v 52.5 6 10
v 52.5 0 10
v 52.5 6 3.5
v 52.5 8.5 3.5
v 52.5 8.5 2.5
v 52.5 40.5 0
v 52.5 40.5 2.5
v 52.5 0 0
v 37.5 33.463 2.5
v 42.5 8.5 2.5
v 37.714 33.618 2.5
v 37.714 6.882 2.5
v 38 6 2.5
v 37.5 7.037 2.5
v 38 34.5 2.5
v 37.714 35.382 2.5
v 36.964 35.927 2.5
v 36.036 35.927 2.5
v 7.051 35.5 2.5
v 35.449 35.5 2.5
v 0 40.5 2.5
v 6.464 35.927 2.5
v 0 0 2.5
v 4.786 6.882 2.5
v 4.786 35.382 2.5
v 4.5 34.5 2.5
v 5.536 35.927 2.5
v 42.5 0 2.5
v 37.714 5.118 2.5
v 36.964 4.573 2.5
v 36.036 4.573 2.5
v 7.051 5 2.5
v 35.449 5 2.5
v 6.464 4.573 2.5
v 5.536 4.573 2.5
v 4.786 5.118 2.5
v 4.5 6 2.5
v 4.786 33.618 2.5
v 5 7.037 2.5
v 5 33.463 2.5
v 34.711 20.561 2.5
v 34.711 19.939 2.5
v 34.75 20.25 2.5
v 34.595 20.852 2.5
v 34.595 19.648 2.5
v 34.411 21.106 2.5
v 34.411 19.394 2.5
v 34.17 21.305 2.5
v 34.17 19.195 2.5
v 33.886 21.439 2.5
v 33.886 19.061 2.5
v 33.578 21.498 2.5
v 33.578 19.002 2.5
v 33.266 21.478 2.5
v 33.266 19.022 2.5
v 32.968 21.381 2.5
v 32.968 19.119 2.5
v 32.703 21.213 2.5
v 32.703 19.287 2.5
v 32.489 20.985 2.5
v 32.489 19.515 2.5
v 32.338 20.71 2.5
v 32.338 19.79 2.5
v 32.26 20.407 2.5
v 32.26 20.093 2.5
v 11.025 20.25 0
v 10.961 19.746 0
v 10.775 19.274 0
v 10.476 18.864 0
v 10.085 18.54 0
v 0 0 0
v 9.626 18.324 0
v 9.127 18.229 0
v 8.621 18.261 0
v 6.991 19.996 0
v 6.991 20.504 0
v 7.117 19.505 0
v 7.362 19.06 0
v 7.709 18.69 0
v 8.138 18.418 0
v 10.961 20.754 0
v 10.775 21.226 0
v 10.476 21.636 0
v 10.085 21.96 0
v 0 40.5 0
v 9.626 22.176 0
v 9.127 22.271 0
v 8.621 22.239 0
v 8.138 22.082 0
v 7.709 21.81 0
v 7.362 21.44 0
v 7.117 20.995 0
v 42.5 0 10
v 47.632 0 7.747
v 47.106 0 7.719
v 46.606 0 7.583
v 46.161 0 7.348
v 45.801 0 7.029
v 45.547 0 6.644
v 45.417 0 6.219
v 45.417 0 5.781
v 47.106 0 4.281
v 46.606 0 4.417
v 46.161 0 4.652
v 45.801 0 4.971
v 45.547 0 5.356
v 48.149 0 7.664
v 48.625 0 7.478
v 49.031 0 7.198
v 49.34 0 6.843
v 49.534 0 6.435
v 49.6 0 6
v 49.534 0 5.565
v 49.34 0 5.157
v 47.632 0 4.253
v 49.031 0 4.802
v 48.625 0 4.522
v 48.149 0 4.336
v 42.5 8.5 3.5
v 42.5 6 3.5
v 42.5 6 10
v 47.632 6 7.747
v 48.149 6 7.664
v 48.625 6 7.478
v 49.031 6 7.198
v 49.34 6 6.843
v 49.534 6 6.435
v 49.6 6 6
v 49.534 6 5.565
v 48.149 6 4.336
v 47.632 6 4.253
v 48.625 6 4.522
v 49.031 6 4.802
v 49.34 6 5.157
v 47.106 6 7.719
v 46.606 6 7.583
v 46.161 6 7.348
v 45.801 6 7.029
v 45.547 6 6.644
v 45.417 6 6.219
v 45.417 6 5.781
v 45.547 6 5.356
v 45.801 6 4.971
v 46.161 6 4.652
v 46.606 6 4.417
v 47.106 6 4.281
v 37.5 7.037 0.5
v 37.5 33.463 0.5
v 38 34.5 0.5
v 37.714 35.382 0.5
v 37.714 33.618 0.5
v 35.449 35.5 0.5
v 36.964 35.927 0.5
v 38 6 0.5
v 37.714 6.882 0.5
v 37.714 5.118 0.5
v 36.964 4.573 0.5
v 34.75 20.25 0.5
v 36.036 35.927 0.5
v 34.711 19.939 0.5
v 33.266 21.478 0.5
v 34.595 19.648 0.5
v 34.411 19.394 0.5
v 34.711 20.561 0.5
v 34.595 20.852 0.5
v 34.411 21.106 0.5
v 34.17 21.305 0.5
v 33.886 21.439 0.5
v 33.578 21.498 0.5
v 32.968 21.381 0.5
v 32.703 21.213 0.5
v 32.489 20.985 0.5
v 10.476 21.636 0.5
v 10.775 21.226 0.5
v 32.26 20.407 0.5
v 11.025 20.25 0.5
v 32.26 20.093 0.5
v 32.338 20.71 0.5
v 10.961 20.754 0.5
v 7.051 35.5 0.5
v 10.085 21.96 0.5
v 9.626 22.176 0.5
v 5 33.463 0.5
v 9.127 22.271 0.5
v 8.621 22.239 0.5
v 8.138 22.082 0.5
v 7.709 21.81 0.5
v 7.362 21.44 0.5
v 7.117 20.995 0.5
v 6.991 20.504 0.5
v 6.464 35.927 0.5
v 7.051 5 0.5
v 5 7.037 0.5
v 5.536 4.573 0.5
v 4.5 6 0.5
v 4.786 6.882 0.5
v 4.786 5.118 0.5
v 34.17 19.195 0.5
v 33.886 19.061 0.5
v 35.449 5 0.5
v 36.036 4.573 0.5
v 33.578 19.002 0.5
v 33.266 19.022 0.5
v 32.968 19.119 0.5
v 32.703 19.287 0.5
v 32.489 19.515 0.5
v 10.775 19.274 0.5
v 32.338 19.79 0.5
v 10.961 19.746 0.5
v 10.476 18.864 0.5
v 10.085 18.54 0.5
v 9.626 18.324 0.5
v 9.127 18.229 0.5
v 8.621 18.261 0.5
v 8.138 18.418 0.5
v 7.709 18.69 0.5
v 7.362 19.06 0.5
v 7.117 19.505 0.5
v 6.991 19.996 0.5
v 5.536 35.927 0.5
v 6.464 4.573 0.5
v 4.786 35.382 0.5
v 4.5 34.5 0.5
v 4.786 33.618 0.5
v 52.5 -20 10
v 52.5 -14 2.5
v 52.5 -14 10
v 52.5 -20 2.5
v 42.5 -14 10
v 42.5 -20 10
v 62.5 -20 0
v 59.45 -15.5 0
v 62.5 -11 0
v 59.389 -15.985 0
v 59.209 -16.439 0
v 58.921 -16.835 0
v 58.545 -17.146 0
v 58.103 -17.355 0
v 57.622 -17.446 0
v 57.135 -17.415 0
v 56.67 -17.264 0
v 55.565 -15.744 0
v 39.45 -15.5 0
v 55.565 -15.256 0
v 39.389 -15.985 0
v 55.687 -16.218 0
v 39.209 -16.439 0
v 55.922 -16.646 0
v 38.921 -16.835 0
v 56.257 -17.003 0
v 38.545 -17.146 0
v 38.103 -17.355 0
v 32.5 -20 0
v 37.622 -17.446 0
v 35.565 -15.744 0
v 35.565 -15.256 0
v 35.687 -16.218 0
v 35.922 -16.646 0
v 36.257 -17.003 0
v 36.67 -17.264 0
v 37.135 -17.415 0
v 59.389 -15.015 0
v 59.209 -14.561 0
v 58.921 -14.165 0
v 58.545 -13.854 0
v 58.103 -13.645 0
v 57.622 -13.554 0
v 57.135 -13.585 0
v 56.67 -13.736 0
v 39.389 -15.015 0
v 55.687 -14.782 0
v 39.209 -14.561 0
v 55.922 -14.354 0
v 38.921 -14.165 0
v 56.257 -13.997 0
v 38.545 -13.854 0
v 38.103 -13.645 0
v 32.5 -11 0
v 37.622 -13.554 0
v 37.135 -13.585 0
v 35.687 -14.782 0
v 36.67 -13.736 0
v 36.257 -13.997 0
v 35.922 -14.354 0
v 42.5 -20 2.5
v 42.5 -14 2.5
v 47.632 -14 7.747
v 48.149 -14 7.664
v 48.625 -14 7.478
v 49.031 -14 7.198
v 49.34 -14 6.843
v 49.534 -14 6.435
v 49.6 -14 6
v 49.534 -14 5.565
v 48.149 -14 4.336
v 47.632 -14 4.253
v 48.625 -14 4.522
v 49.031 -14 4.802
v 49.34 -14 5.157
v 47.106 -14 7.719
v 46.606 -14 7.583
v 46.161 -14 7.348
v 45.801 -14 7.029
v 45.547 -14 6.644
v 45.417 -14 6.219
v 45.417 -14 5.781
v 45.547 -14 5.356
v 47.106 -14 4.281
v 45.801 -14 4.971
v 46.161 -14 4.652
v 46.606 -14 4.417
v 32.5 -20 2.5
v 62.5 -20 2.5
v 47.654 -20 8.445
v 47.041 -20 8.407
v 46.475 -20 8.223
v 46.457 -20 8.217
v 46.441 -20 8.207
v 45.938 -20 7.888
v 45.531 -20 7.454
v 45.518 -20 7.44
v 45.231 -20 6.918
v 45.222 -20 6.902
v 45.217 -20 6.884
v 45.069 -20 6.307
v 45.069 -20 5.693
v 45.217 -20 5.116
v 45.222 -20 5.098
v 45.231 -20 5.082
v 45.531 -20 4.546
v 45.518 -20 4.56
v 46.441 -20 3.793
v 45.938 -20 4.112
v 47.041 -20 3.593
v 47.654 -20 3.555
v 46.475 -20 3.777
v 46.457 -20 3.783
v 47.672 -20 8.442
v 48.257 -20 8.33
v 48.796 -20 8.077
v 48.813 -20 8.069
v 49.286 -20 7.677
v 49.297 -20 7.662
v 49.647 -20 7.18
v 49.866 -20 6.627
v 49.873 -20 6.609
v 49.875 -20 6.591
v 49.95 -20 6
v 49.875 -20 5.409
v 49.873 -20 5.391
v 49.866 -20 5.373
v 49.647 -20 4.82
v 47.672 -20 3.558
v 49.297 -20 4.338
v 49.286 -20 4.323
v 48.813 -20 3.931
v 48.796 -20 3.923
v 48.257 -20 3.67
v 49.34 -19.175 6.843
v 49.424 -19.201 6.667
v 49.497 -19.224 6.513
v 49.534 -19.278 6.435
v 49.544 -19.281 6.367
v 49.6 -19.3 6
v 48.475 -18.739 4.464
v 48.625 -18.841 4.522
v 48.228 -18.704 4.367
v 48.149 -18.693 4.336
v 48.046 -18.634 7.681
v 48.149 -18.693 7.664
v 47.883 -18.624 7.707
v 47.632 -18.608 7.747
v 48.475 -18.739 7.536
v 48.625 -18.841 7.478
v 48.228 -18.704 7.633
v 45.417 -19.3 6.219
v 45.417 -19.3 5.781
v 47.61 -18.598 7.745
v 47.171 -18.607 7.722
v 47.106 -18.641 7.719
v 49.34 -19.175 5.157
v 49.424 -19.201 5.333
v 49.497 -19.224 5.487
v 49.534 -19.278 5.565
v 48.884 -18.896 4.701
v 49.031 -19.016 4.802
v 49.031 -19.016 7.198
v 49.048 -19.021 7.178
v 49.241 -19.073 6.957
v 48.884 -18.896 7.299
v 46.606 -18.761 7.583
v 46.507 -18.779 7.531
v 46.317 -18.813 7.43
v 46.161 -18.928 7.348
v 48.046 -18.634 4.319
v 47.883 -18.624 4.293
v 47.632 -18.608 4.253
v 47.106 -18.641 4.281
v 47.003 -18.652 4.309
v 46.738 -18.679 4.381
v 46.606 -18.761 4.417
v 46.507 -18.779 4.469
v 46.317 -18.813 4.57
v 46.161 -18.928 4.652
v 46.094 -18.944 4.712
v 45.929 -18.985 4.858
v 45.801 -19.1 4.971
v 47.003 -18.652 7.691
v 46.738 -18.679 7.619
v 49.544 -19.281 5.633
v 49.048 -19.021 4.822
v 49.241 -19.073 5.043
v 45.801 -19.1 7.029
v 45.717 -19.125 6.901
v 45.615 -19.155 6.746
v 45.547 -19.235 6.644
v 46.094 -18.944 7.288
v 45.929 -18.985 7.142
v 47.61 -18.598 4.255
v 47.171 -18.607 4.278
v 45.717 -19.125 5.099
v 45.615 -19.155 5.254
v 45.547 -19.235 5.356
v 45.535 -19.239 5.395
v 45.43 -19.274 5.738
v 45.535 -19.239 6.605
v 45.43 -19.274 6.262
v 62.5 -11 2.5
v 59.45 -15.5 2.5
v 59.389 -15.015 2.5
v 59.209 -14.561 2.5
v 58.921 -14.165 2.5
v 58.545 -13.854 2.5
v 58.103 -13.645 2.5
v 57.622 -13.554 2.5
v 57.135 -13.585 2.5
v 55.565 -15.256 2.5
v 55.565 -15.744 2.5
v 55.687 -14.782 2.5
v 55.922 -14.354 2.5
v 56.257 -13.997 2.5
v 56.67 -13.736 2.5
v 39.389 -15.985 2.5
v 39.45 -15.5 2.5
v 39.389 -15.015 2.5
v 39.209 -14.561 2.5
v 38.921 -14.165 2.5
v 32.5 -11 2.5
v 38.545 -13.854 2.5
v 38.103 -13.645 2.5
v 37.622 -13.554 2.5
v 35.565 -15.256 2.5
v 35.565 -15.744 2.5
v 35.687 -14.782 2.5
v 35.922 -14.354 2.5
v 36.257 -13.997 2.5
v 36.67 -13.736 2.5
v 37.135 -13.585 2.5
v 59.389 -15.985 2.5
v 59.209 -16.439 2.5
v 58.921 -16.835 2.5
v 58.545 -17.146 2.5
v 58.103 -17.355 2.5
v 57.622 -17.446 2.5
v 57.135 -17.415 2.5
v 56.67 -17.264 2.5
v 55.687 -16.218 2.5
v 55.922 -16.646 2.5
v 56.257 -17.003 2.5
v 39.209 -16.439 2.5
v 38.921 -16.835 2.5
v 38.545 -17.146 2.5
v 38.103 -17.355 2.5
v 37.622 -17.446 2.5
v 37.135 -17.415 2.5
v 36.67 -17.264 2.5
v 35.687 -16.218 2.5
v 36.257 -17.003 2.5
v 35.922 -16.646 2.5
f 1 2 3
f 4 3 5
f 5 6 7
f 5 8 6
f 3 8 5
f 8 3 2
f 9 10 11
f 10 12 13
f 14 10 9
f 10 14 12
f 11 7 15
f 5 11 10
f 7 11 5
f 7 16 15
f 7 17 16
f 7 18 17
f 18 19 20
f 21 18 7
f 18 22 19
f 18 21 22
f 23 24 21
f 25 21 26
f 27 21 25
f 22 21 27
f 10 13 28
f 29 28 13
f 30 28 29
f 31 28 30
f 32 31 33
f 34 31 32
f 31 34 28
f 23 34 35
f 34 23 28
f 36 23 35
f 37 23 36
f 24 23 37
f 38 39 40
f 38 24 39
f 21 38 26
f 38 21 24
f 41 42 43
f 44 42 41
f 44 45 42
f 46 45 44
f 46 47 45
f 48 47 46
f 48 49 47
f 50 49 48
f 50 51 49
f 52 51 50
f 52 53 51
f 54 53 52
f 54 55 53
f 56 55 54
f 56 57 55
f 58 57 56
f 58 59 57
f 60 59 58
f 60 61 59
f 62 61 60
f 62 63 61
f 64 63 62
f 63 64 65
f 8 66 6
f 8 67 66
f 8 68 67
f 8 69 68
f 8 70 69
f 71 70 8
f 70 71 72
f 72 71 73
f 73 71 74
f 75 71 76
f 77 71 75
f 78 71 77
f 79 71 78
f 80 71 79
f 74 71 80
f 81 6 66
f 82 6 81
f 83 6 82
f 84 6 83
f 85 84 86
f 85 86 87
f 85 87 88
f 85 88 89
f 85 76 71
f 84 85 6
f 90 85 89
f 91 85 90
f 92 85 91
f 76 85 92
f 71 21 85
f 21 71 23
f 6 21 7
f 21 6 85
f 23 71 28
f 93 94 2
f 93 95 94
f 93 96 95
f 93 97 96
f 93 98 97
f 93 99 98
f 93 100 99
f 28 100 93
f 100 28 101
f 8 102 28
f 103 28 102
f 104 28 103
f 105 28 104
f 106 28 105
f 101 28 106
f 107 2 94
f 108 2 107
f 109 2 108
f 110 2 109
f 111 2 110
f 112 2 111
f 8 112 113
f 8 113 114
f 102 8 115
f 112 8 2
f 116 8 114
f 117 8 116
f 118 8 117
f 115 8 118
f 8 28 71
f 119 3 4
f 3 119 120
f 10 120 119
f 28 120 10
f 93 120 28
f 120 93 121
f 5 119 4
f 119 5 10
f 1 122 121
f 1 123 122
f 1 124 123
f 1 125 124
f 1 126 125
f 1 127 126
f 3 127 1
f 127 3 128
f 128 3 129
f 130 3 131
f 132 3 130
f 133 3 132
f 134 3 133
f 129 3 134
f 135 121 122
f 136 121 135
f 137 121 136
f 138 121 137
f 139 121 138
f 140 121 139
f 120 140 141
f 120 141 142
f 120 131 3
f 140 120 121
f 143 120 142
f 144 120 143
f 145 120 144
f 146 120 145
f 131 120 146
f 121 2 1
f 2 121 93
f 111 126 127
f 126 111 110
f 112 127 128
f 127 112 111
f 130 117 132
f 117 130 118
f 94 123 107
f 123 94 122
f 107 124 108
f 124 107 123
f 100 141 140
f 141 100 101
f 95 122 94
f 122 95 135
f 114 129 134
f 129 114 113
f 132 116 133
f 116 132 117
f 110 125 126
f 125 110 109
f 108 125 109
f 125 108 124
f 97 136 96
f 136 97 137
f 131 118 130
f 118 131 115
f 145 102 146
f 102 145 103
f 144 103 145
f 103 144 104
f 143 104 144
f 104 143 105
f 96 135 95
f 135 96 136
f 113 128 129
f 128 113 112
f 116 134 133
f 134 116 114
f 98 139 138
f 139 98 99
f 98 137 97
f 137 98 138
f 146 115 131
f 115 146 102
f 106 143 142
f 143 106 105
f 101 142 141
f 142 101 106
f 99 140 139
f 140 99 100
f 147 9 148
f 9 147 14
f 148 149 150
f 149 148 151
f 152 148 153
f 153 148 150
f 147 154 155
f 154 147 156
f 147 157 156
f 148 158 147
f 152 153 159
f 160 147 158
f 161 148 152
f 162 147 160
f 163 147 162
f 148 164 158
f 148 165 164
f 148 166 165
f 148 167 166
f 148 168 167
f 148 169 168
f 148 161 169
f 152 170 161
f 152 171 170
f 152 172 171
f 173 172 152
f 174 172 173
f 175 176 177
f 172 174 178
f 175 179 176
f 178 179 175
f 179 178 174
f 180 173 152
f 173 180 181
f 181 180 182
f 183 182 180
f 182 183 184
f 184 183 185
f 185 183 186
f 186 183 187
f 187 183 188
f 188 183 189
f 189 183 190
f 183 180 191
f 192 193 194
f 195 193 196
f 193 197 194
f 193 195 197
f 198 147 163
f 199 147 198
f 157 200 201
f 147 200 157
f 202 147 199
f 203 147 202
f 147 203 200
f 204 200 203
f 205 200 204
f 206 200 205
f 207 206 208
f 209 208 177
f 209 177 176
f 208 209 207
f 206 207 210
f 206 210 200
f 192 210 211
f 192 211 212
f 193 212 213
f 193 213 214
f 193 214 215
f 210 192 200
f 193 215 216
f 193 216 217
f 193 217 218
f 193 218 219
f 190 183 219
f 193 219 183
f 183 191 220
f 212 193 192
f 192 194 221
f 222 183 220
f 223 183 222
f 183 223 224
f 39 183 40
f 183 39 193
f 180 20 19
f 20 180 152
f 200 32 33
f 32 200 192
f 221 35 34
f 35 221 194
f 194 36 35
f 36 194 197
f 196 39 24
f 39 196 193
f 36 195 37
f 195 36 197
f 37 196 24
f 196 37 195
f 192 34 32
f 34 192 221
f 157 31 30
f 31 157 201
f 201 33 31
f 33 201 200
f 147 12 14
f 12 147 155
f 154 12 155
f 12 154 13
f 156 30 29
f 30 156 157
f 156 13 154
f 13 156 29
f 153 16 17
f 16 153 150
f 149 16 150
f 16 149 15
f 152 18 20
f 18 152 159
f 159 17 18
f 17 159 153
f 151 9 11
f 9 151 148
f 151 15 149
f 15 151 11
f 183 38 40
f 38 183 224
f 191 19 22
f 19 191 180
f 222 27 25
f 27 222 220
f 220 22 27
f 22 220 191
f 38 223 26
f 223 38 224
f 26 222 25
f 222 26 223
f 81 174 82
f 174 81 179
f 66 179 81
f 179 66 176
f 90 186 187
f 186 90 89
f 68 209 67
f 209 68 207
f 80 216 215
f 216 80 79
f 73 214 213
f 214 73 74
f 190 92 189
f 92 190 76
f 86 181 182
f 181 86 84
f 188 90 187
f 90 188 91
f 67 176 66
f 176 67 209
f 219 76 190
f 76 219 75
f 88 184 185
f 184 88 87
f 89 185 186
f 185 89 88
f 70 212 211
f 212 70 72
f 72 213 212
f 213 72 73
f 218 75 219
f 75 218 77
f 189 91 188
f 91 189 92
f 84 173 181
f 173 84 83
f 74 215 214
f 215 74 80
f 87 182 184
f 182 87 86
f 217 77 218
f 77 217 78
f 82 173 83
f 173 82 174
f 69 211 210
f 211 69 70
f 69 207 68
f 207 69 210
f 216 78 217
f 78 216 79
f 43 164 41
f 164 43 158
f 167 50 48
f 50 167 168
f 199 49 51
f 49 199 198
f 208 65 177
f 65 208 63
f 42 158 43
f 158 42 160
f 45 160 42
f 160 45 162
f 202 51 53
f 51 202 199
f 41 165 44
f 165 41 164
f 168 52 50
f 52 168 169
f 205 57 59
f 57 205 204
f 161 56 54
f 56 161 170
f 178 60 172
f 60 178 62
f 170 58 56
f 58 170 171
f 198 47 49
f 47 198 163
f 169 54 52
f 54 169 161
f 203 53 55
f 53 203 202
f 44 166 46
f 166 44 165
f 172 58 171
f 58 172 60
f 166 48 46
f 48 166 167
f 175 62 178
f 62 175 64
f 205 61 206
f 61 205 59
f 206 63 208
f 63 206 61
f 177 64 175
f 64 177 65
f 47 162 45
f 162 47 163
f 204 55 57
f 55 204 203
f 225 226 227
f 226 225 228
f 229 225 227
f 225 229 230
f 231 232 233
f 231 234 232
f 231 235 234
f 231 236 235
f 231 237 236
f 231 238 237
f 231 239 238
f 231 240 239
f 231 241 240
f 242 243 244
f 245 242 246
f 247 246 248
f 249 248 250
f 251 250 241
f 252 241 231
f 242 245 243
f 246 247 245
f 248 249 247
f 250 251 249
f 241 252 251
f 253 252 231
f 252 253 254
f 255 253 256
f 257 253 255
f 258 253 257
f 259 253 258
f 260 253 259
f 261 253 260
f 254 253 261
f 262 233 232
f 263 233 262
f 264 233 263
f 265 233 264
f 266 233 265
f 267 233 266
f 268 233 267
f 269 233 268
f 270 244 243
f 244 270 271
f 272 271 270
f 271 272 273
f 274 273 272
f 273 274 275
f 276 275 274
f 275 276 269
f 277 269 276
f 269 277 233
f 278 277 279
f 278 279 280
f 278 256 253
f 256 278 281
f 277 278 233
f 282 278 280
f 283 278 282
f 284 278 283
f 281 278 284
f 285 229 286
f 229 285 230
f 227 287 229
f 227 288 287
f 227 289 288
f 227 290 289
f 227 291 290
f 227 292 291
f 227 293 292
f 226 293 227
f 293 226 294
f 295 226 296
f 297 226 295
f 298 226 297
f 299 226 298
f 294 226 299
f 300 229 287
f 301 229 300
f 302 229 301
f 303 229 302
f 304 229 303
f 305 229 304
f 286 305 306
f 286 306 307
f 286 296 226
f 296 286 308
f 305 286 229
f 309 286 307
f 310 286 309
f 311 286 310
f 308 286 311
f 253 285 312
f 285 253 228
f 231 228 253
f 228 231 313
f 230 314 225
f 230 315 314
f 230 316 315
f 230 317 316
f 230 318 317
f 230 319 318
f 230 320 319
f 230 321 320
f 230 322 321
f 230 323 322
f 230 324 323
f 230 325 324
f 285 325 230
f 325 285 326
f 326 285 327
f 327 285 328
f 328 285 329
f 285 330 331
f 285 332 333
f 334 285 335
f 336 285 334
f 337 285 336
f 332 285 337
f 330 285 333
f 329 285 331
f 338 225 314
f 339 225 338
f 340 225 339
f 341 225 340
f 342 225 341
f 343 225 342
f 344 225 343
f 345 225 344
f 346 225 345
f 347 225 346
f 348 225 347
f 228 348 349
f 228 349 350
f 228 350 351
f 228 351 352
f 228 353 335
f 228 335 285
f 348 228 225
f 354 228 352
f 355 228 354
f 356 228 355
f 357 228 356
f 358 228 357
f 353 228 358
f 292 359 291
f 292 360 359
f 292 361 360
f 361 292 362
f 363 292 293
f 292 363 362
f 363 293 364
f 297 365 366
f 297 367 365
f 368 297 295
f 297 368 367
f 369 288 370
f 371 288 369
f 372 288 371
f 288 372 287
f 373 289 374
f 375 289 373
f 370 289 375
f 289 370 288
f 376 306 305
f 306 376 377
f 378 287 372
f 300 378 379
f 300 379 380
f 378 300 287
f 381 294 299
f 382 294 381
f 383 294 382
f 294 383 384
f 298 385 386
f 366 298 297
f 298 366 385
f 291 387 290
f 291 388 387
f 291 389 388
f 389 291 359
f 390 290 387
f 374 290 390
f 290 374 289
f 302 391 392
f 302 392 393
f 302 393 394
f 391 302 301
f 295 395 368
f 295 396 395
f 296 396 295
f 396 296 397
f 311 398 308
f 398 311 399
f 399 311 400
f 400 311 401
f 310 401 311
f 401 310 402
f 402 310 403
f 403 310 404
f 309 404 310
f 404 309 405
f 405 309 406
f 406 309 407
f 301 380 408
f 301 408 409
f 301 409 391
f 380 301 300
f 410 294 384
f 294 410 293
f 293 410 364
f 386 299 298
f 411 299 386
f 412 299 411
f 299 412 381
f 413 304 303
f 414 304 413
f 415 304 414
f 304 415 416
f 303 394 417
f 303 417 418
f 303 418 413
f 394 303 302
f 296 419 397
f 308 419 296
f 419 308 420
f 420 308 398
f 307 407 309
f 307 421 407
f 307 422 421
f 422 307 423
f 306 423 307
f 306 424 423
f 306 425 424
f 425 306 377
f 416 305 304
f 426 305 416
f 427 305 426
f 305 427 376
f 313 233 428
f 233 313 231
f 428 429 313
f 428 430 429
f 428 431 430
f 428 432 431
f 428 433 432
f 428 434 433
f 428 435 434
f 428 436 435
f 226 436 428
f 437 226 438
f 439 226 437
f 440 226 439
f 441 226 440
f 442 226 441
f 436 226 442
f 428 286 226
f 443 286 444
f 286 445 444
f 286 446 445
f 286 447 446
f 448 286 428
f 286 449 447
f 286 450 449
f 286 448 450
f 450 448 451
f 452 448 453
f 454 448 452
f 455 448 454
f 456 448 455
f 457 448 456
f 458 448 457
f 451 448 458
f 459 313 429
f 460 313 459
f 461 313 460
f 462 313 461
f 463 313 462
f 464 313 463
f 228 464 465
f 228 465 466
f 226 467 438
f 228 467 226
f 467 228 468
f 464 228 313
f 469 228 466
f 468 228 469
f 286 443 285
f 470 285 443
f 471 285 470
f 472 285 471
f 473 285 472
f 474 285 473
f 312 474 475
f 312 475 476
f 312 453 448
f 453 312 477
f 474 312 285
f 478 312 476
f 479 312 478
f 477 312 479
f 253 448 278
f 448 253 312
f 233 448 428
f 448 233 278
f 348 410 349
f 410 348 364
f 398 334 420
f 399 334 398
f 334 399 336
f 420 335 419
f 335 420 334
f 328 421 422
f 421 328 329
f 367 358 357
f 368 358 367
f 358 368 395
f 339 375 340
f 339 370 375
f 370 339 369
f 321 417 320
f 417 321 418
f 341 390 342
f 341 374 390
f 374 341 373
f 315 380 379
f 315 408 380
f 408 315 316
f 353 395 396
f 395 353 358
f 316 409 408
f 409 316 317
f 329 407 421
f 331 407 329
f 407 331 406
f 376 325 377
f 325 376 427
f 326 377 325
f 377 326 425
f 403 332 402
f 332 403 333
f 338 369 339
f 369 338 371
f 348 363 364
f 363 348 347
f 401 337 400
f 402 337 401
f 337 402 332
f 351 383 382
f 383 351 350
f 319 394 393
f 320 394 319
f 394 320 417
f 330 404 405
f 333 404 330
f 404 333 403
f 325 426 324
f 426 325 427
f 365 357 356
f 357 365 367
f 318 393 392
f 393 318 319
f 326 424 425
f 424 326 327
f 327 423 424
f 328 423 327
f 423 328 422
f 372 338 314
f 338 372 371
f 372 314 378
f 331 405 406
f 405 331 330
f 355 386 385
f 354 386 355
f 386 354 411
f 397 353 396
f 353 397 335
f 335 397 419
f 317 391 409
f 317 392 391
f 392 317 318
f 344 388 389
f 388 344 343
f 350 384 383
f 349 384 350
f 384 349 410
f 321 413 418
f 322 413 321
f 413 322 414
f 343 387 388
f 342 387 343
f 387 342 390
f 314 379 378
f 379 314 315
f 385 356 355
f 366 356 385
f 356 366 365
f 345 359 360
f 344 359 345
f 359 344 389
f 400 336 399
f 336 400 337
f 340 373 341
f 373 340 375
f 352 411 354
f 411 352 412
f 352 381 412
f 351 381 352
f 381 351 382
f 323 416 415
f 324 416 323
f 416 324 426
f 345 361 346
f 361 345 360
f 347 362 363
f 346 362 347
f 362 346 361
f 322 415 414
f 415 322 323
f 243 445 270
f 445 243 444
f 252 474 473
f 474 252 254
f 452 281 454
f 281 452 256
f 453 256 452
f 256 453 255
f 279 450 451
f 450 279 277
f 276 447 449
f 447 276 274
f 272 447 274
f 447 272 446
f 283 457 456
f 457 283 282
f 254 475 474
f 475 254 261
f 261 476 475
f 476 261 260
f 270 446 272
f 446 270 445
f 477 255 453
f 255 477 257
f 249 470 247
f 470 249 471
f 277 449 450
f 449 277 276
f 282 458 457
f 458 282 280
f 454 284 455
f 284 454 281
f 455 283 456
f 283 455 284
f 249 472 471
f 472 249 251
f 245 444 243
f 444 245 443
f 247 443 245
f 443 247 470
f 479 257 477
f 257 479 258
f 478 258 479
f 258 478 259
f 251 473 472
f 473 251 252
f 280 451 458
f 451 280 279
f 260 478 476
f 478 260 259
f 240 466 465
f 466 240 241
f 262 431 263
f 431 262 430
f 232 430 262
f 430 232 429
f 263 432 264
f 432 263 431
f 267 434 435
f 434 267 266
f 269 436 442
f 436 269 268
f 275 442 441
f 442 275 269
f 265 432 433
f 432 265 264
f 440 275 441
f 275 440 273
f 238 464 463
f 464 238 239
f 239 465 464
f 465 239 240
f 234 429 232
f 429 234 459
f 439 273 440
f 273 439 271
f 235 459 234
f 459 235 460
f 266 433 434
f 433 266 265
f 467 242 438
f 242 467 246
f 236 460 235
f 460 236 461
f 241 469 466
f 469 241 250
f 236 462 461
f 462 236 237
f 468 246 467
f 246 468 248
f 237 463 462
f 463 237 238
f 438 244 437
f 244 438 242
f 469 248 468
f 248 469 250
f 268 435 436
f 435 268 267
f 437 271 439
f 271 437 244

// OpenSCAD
// Aimer design for the laser holder 

// Extra spacing to print internal sizes more correctly. 
internal_size_fudge = 0.5;

// Sizes of holder
holder_width = 32+internal_size_fudge;
holder_length = 30+internal_size_fudge;
holder_hole_diam = 3 ;
holder_hole_distance = 4; // (3/2+1.8)
holder_corner_diam = 3 ;

// Sizes of the aimer
aimer_border_thickness = 5;
aimer_border_height = 2;
aimer_bottom_thickness = 0.5;

aimer_set_screw_diam = 3.5;
aimer_set_screw_height = 6;
aimer_set_width = 10;
aimer_set_length = 6;
aimer_set_height = 10;
aimer_stud_length = aimer_set_length + 3;

aimer_width = holder_width+aimer_border_thickness*2+aimer_set_width;
aimer_length = holder_length+aimer_border_thickness*2;

stud_width = 30;
stud_screw_diam = 3*1.3;

module holder_point() {
    cylinder(h=50, r=holder_hole_diam/2, $fn=25);
}

module fixed_point() {
    cylinder(h=50, r=stud_screw_diam/2, $fn=25);
}

module holder() {
	render() difference() {
		union() { 
			cube([holder_width, holder_length, 30]);

			translate([1, 1, 0]) cylinder(h=30, r=holder_corner_diam/2, $fn=10);
			translate([holder_width-1, 1, 0]) cylinder(h=30, r=holder_corner_diam/2, $fn=10);
			translate([holder_width-1, holder_length-1, 0]) cylinder(h=30, r=holder_corner_diam/2, $fn=10);
			translate([1, holder_length-1, 0]) cylinder(h=30, r=holder_corner_diam/2, $fn=10);
			translate([holder_hole_distance,
					   holder_length/2,
					   -10]) scale(1.35) holder_point();
		} 
		translate([holder_width-holder_hole_distance,
				   holder_length/2,
				   -10]) scale(1/1.2) holder_point();
	}
}

module aimer_setter() {
	render() difference() {
		cube([aimer_set_width, 
			  aimer_set_length, 
			  aimer_set_height]); 
		translate([aimer_set_width/2,
				   aimer_set_length*1.5,
				   aimer_set_screw_height]) rotate([90,0,0]) 
				scale([1.2,1,1]) cylinder(h=aimer_set_length*2,
					       r=aimer_set_screw_diam/2, $fn=25);
	}
}

module aimer_baseplate() {
	cube([aimer_width, 
		  aimer_length,
  		  aimer_border_height+aimer_bottom_thickness ]);
	translate([aimer_width-aimer_set_width,
			   aimer_set_length,
                 aimer_border_height+aimer_bottom_thickness]) cube([aimer_set_width, 2.5, 1]); // ledge to stop setting nut from turning.
}

module aimer() {
	render() difference() {
		union() { 
			aimer_baseplate();
			translate([aimer_width-aimer_set_width,0,0]) aimer_setter();
		}
		translate([aimer_border_thickness,
				   aimer_border_thickness,
				   aimer_bottom_thickness]) holder();
	}
}


module aimer_stud() {
  render() difference() {
        union() {
            translate([(stud_width-aimer_set_width)/2,0,0]) aimer_setter();
            cube([stud_width,
                  aimer_stud_length,
                  aimer_bottom_thickness+aimer_border_height]);
        }
        translate([stud_width/2,-0.1,aimer_set_screw_height]) rotate([-90,0,0]) taper();
        translate([5,
                   aimer_stud_length/2,
                   0]) fixed_point();
        translate([stud_width-5,
                   aimer_stud_length/2,
                   0]) fixed_point();
    }
}

module taper() {
    cylinder(r1=5/2, r2=3/2, h=2, $fn=25);
}

aimer();

translate([aimer_width-20,
           -20,
           0]) aimer_stud();
